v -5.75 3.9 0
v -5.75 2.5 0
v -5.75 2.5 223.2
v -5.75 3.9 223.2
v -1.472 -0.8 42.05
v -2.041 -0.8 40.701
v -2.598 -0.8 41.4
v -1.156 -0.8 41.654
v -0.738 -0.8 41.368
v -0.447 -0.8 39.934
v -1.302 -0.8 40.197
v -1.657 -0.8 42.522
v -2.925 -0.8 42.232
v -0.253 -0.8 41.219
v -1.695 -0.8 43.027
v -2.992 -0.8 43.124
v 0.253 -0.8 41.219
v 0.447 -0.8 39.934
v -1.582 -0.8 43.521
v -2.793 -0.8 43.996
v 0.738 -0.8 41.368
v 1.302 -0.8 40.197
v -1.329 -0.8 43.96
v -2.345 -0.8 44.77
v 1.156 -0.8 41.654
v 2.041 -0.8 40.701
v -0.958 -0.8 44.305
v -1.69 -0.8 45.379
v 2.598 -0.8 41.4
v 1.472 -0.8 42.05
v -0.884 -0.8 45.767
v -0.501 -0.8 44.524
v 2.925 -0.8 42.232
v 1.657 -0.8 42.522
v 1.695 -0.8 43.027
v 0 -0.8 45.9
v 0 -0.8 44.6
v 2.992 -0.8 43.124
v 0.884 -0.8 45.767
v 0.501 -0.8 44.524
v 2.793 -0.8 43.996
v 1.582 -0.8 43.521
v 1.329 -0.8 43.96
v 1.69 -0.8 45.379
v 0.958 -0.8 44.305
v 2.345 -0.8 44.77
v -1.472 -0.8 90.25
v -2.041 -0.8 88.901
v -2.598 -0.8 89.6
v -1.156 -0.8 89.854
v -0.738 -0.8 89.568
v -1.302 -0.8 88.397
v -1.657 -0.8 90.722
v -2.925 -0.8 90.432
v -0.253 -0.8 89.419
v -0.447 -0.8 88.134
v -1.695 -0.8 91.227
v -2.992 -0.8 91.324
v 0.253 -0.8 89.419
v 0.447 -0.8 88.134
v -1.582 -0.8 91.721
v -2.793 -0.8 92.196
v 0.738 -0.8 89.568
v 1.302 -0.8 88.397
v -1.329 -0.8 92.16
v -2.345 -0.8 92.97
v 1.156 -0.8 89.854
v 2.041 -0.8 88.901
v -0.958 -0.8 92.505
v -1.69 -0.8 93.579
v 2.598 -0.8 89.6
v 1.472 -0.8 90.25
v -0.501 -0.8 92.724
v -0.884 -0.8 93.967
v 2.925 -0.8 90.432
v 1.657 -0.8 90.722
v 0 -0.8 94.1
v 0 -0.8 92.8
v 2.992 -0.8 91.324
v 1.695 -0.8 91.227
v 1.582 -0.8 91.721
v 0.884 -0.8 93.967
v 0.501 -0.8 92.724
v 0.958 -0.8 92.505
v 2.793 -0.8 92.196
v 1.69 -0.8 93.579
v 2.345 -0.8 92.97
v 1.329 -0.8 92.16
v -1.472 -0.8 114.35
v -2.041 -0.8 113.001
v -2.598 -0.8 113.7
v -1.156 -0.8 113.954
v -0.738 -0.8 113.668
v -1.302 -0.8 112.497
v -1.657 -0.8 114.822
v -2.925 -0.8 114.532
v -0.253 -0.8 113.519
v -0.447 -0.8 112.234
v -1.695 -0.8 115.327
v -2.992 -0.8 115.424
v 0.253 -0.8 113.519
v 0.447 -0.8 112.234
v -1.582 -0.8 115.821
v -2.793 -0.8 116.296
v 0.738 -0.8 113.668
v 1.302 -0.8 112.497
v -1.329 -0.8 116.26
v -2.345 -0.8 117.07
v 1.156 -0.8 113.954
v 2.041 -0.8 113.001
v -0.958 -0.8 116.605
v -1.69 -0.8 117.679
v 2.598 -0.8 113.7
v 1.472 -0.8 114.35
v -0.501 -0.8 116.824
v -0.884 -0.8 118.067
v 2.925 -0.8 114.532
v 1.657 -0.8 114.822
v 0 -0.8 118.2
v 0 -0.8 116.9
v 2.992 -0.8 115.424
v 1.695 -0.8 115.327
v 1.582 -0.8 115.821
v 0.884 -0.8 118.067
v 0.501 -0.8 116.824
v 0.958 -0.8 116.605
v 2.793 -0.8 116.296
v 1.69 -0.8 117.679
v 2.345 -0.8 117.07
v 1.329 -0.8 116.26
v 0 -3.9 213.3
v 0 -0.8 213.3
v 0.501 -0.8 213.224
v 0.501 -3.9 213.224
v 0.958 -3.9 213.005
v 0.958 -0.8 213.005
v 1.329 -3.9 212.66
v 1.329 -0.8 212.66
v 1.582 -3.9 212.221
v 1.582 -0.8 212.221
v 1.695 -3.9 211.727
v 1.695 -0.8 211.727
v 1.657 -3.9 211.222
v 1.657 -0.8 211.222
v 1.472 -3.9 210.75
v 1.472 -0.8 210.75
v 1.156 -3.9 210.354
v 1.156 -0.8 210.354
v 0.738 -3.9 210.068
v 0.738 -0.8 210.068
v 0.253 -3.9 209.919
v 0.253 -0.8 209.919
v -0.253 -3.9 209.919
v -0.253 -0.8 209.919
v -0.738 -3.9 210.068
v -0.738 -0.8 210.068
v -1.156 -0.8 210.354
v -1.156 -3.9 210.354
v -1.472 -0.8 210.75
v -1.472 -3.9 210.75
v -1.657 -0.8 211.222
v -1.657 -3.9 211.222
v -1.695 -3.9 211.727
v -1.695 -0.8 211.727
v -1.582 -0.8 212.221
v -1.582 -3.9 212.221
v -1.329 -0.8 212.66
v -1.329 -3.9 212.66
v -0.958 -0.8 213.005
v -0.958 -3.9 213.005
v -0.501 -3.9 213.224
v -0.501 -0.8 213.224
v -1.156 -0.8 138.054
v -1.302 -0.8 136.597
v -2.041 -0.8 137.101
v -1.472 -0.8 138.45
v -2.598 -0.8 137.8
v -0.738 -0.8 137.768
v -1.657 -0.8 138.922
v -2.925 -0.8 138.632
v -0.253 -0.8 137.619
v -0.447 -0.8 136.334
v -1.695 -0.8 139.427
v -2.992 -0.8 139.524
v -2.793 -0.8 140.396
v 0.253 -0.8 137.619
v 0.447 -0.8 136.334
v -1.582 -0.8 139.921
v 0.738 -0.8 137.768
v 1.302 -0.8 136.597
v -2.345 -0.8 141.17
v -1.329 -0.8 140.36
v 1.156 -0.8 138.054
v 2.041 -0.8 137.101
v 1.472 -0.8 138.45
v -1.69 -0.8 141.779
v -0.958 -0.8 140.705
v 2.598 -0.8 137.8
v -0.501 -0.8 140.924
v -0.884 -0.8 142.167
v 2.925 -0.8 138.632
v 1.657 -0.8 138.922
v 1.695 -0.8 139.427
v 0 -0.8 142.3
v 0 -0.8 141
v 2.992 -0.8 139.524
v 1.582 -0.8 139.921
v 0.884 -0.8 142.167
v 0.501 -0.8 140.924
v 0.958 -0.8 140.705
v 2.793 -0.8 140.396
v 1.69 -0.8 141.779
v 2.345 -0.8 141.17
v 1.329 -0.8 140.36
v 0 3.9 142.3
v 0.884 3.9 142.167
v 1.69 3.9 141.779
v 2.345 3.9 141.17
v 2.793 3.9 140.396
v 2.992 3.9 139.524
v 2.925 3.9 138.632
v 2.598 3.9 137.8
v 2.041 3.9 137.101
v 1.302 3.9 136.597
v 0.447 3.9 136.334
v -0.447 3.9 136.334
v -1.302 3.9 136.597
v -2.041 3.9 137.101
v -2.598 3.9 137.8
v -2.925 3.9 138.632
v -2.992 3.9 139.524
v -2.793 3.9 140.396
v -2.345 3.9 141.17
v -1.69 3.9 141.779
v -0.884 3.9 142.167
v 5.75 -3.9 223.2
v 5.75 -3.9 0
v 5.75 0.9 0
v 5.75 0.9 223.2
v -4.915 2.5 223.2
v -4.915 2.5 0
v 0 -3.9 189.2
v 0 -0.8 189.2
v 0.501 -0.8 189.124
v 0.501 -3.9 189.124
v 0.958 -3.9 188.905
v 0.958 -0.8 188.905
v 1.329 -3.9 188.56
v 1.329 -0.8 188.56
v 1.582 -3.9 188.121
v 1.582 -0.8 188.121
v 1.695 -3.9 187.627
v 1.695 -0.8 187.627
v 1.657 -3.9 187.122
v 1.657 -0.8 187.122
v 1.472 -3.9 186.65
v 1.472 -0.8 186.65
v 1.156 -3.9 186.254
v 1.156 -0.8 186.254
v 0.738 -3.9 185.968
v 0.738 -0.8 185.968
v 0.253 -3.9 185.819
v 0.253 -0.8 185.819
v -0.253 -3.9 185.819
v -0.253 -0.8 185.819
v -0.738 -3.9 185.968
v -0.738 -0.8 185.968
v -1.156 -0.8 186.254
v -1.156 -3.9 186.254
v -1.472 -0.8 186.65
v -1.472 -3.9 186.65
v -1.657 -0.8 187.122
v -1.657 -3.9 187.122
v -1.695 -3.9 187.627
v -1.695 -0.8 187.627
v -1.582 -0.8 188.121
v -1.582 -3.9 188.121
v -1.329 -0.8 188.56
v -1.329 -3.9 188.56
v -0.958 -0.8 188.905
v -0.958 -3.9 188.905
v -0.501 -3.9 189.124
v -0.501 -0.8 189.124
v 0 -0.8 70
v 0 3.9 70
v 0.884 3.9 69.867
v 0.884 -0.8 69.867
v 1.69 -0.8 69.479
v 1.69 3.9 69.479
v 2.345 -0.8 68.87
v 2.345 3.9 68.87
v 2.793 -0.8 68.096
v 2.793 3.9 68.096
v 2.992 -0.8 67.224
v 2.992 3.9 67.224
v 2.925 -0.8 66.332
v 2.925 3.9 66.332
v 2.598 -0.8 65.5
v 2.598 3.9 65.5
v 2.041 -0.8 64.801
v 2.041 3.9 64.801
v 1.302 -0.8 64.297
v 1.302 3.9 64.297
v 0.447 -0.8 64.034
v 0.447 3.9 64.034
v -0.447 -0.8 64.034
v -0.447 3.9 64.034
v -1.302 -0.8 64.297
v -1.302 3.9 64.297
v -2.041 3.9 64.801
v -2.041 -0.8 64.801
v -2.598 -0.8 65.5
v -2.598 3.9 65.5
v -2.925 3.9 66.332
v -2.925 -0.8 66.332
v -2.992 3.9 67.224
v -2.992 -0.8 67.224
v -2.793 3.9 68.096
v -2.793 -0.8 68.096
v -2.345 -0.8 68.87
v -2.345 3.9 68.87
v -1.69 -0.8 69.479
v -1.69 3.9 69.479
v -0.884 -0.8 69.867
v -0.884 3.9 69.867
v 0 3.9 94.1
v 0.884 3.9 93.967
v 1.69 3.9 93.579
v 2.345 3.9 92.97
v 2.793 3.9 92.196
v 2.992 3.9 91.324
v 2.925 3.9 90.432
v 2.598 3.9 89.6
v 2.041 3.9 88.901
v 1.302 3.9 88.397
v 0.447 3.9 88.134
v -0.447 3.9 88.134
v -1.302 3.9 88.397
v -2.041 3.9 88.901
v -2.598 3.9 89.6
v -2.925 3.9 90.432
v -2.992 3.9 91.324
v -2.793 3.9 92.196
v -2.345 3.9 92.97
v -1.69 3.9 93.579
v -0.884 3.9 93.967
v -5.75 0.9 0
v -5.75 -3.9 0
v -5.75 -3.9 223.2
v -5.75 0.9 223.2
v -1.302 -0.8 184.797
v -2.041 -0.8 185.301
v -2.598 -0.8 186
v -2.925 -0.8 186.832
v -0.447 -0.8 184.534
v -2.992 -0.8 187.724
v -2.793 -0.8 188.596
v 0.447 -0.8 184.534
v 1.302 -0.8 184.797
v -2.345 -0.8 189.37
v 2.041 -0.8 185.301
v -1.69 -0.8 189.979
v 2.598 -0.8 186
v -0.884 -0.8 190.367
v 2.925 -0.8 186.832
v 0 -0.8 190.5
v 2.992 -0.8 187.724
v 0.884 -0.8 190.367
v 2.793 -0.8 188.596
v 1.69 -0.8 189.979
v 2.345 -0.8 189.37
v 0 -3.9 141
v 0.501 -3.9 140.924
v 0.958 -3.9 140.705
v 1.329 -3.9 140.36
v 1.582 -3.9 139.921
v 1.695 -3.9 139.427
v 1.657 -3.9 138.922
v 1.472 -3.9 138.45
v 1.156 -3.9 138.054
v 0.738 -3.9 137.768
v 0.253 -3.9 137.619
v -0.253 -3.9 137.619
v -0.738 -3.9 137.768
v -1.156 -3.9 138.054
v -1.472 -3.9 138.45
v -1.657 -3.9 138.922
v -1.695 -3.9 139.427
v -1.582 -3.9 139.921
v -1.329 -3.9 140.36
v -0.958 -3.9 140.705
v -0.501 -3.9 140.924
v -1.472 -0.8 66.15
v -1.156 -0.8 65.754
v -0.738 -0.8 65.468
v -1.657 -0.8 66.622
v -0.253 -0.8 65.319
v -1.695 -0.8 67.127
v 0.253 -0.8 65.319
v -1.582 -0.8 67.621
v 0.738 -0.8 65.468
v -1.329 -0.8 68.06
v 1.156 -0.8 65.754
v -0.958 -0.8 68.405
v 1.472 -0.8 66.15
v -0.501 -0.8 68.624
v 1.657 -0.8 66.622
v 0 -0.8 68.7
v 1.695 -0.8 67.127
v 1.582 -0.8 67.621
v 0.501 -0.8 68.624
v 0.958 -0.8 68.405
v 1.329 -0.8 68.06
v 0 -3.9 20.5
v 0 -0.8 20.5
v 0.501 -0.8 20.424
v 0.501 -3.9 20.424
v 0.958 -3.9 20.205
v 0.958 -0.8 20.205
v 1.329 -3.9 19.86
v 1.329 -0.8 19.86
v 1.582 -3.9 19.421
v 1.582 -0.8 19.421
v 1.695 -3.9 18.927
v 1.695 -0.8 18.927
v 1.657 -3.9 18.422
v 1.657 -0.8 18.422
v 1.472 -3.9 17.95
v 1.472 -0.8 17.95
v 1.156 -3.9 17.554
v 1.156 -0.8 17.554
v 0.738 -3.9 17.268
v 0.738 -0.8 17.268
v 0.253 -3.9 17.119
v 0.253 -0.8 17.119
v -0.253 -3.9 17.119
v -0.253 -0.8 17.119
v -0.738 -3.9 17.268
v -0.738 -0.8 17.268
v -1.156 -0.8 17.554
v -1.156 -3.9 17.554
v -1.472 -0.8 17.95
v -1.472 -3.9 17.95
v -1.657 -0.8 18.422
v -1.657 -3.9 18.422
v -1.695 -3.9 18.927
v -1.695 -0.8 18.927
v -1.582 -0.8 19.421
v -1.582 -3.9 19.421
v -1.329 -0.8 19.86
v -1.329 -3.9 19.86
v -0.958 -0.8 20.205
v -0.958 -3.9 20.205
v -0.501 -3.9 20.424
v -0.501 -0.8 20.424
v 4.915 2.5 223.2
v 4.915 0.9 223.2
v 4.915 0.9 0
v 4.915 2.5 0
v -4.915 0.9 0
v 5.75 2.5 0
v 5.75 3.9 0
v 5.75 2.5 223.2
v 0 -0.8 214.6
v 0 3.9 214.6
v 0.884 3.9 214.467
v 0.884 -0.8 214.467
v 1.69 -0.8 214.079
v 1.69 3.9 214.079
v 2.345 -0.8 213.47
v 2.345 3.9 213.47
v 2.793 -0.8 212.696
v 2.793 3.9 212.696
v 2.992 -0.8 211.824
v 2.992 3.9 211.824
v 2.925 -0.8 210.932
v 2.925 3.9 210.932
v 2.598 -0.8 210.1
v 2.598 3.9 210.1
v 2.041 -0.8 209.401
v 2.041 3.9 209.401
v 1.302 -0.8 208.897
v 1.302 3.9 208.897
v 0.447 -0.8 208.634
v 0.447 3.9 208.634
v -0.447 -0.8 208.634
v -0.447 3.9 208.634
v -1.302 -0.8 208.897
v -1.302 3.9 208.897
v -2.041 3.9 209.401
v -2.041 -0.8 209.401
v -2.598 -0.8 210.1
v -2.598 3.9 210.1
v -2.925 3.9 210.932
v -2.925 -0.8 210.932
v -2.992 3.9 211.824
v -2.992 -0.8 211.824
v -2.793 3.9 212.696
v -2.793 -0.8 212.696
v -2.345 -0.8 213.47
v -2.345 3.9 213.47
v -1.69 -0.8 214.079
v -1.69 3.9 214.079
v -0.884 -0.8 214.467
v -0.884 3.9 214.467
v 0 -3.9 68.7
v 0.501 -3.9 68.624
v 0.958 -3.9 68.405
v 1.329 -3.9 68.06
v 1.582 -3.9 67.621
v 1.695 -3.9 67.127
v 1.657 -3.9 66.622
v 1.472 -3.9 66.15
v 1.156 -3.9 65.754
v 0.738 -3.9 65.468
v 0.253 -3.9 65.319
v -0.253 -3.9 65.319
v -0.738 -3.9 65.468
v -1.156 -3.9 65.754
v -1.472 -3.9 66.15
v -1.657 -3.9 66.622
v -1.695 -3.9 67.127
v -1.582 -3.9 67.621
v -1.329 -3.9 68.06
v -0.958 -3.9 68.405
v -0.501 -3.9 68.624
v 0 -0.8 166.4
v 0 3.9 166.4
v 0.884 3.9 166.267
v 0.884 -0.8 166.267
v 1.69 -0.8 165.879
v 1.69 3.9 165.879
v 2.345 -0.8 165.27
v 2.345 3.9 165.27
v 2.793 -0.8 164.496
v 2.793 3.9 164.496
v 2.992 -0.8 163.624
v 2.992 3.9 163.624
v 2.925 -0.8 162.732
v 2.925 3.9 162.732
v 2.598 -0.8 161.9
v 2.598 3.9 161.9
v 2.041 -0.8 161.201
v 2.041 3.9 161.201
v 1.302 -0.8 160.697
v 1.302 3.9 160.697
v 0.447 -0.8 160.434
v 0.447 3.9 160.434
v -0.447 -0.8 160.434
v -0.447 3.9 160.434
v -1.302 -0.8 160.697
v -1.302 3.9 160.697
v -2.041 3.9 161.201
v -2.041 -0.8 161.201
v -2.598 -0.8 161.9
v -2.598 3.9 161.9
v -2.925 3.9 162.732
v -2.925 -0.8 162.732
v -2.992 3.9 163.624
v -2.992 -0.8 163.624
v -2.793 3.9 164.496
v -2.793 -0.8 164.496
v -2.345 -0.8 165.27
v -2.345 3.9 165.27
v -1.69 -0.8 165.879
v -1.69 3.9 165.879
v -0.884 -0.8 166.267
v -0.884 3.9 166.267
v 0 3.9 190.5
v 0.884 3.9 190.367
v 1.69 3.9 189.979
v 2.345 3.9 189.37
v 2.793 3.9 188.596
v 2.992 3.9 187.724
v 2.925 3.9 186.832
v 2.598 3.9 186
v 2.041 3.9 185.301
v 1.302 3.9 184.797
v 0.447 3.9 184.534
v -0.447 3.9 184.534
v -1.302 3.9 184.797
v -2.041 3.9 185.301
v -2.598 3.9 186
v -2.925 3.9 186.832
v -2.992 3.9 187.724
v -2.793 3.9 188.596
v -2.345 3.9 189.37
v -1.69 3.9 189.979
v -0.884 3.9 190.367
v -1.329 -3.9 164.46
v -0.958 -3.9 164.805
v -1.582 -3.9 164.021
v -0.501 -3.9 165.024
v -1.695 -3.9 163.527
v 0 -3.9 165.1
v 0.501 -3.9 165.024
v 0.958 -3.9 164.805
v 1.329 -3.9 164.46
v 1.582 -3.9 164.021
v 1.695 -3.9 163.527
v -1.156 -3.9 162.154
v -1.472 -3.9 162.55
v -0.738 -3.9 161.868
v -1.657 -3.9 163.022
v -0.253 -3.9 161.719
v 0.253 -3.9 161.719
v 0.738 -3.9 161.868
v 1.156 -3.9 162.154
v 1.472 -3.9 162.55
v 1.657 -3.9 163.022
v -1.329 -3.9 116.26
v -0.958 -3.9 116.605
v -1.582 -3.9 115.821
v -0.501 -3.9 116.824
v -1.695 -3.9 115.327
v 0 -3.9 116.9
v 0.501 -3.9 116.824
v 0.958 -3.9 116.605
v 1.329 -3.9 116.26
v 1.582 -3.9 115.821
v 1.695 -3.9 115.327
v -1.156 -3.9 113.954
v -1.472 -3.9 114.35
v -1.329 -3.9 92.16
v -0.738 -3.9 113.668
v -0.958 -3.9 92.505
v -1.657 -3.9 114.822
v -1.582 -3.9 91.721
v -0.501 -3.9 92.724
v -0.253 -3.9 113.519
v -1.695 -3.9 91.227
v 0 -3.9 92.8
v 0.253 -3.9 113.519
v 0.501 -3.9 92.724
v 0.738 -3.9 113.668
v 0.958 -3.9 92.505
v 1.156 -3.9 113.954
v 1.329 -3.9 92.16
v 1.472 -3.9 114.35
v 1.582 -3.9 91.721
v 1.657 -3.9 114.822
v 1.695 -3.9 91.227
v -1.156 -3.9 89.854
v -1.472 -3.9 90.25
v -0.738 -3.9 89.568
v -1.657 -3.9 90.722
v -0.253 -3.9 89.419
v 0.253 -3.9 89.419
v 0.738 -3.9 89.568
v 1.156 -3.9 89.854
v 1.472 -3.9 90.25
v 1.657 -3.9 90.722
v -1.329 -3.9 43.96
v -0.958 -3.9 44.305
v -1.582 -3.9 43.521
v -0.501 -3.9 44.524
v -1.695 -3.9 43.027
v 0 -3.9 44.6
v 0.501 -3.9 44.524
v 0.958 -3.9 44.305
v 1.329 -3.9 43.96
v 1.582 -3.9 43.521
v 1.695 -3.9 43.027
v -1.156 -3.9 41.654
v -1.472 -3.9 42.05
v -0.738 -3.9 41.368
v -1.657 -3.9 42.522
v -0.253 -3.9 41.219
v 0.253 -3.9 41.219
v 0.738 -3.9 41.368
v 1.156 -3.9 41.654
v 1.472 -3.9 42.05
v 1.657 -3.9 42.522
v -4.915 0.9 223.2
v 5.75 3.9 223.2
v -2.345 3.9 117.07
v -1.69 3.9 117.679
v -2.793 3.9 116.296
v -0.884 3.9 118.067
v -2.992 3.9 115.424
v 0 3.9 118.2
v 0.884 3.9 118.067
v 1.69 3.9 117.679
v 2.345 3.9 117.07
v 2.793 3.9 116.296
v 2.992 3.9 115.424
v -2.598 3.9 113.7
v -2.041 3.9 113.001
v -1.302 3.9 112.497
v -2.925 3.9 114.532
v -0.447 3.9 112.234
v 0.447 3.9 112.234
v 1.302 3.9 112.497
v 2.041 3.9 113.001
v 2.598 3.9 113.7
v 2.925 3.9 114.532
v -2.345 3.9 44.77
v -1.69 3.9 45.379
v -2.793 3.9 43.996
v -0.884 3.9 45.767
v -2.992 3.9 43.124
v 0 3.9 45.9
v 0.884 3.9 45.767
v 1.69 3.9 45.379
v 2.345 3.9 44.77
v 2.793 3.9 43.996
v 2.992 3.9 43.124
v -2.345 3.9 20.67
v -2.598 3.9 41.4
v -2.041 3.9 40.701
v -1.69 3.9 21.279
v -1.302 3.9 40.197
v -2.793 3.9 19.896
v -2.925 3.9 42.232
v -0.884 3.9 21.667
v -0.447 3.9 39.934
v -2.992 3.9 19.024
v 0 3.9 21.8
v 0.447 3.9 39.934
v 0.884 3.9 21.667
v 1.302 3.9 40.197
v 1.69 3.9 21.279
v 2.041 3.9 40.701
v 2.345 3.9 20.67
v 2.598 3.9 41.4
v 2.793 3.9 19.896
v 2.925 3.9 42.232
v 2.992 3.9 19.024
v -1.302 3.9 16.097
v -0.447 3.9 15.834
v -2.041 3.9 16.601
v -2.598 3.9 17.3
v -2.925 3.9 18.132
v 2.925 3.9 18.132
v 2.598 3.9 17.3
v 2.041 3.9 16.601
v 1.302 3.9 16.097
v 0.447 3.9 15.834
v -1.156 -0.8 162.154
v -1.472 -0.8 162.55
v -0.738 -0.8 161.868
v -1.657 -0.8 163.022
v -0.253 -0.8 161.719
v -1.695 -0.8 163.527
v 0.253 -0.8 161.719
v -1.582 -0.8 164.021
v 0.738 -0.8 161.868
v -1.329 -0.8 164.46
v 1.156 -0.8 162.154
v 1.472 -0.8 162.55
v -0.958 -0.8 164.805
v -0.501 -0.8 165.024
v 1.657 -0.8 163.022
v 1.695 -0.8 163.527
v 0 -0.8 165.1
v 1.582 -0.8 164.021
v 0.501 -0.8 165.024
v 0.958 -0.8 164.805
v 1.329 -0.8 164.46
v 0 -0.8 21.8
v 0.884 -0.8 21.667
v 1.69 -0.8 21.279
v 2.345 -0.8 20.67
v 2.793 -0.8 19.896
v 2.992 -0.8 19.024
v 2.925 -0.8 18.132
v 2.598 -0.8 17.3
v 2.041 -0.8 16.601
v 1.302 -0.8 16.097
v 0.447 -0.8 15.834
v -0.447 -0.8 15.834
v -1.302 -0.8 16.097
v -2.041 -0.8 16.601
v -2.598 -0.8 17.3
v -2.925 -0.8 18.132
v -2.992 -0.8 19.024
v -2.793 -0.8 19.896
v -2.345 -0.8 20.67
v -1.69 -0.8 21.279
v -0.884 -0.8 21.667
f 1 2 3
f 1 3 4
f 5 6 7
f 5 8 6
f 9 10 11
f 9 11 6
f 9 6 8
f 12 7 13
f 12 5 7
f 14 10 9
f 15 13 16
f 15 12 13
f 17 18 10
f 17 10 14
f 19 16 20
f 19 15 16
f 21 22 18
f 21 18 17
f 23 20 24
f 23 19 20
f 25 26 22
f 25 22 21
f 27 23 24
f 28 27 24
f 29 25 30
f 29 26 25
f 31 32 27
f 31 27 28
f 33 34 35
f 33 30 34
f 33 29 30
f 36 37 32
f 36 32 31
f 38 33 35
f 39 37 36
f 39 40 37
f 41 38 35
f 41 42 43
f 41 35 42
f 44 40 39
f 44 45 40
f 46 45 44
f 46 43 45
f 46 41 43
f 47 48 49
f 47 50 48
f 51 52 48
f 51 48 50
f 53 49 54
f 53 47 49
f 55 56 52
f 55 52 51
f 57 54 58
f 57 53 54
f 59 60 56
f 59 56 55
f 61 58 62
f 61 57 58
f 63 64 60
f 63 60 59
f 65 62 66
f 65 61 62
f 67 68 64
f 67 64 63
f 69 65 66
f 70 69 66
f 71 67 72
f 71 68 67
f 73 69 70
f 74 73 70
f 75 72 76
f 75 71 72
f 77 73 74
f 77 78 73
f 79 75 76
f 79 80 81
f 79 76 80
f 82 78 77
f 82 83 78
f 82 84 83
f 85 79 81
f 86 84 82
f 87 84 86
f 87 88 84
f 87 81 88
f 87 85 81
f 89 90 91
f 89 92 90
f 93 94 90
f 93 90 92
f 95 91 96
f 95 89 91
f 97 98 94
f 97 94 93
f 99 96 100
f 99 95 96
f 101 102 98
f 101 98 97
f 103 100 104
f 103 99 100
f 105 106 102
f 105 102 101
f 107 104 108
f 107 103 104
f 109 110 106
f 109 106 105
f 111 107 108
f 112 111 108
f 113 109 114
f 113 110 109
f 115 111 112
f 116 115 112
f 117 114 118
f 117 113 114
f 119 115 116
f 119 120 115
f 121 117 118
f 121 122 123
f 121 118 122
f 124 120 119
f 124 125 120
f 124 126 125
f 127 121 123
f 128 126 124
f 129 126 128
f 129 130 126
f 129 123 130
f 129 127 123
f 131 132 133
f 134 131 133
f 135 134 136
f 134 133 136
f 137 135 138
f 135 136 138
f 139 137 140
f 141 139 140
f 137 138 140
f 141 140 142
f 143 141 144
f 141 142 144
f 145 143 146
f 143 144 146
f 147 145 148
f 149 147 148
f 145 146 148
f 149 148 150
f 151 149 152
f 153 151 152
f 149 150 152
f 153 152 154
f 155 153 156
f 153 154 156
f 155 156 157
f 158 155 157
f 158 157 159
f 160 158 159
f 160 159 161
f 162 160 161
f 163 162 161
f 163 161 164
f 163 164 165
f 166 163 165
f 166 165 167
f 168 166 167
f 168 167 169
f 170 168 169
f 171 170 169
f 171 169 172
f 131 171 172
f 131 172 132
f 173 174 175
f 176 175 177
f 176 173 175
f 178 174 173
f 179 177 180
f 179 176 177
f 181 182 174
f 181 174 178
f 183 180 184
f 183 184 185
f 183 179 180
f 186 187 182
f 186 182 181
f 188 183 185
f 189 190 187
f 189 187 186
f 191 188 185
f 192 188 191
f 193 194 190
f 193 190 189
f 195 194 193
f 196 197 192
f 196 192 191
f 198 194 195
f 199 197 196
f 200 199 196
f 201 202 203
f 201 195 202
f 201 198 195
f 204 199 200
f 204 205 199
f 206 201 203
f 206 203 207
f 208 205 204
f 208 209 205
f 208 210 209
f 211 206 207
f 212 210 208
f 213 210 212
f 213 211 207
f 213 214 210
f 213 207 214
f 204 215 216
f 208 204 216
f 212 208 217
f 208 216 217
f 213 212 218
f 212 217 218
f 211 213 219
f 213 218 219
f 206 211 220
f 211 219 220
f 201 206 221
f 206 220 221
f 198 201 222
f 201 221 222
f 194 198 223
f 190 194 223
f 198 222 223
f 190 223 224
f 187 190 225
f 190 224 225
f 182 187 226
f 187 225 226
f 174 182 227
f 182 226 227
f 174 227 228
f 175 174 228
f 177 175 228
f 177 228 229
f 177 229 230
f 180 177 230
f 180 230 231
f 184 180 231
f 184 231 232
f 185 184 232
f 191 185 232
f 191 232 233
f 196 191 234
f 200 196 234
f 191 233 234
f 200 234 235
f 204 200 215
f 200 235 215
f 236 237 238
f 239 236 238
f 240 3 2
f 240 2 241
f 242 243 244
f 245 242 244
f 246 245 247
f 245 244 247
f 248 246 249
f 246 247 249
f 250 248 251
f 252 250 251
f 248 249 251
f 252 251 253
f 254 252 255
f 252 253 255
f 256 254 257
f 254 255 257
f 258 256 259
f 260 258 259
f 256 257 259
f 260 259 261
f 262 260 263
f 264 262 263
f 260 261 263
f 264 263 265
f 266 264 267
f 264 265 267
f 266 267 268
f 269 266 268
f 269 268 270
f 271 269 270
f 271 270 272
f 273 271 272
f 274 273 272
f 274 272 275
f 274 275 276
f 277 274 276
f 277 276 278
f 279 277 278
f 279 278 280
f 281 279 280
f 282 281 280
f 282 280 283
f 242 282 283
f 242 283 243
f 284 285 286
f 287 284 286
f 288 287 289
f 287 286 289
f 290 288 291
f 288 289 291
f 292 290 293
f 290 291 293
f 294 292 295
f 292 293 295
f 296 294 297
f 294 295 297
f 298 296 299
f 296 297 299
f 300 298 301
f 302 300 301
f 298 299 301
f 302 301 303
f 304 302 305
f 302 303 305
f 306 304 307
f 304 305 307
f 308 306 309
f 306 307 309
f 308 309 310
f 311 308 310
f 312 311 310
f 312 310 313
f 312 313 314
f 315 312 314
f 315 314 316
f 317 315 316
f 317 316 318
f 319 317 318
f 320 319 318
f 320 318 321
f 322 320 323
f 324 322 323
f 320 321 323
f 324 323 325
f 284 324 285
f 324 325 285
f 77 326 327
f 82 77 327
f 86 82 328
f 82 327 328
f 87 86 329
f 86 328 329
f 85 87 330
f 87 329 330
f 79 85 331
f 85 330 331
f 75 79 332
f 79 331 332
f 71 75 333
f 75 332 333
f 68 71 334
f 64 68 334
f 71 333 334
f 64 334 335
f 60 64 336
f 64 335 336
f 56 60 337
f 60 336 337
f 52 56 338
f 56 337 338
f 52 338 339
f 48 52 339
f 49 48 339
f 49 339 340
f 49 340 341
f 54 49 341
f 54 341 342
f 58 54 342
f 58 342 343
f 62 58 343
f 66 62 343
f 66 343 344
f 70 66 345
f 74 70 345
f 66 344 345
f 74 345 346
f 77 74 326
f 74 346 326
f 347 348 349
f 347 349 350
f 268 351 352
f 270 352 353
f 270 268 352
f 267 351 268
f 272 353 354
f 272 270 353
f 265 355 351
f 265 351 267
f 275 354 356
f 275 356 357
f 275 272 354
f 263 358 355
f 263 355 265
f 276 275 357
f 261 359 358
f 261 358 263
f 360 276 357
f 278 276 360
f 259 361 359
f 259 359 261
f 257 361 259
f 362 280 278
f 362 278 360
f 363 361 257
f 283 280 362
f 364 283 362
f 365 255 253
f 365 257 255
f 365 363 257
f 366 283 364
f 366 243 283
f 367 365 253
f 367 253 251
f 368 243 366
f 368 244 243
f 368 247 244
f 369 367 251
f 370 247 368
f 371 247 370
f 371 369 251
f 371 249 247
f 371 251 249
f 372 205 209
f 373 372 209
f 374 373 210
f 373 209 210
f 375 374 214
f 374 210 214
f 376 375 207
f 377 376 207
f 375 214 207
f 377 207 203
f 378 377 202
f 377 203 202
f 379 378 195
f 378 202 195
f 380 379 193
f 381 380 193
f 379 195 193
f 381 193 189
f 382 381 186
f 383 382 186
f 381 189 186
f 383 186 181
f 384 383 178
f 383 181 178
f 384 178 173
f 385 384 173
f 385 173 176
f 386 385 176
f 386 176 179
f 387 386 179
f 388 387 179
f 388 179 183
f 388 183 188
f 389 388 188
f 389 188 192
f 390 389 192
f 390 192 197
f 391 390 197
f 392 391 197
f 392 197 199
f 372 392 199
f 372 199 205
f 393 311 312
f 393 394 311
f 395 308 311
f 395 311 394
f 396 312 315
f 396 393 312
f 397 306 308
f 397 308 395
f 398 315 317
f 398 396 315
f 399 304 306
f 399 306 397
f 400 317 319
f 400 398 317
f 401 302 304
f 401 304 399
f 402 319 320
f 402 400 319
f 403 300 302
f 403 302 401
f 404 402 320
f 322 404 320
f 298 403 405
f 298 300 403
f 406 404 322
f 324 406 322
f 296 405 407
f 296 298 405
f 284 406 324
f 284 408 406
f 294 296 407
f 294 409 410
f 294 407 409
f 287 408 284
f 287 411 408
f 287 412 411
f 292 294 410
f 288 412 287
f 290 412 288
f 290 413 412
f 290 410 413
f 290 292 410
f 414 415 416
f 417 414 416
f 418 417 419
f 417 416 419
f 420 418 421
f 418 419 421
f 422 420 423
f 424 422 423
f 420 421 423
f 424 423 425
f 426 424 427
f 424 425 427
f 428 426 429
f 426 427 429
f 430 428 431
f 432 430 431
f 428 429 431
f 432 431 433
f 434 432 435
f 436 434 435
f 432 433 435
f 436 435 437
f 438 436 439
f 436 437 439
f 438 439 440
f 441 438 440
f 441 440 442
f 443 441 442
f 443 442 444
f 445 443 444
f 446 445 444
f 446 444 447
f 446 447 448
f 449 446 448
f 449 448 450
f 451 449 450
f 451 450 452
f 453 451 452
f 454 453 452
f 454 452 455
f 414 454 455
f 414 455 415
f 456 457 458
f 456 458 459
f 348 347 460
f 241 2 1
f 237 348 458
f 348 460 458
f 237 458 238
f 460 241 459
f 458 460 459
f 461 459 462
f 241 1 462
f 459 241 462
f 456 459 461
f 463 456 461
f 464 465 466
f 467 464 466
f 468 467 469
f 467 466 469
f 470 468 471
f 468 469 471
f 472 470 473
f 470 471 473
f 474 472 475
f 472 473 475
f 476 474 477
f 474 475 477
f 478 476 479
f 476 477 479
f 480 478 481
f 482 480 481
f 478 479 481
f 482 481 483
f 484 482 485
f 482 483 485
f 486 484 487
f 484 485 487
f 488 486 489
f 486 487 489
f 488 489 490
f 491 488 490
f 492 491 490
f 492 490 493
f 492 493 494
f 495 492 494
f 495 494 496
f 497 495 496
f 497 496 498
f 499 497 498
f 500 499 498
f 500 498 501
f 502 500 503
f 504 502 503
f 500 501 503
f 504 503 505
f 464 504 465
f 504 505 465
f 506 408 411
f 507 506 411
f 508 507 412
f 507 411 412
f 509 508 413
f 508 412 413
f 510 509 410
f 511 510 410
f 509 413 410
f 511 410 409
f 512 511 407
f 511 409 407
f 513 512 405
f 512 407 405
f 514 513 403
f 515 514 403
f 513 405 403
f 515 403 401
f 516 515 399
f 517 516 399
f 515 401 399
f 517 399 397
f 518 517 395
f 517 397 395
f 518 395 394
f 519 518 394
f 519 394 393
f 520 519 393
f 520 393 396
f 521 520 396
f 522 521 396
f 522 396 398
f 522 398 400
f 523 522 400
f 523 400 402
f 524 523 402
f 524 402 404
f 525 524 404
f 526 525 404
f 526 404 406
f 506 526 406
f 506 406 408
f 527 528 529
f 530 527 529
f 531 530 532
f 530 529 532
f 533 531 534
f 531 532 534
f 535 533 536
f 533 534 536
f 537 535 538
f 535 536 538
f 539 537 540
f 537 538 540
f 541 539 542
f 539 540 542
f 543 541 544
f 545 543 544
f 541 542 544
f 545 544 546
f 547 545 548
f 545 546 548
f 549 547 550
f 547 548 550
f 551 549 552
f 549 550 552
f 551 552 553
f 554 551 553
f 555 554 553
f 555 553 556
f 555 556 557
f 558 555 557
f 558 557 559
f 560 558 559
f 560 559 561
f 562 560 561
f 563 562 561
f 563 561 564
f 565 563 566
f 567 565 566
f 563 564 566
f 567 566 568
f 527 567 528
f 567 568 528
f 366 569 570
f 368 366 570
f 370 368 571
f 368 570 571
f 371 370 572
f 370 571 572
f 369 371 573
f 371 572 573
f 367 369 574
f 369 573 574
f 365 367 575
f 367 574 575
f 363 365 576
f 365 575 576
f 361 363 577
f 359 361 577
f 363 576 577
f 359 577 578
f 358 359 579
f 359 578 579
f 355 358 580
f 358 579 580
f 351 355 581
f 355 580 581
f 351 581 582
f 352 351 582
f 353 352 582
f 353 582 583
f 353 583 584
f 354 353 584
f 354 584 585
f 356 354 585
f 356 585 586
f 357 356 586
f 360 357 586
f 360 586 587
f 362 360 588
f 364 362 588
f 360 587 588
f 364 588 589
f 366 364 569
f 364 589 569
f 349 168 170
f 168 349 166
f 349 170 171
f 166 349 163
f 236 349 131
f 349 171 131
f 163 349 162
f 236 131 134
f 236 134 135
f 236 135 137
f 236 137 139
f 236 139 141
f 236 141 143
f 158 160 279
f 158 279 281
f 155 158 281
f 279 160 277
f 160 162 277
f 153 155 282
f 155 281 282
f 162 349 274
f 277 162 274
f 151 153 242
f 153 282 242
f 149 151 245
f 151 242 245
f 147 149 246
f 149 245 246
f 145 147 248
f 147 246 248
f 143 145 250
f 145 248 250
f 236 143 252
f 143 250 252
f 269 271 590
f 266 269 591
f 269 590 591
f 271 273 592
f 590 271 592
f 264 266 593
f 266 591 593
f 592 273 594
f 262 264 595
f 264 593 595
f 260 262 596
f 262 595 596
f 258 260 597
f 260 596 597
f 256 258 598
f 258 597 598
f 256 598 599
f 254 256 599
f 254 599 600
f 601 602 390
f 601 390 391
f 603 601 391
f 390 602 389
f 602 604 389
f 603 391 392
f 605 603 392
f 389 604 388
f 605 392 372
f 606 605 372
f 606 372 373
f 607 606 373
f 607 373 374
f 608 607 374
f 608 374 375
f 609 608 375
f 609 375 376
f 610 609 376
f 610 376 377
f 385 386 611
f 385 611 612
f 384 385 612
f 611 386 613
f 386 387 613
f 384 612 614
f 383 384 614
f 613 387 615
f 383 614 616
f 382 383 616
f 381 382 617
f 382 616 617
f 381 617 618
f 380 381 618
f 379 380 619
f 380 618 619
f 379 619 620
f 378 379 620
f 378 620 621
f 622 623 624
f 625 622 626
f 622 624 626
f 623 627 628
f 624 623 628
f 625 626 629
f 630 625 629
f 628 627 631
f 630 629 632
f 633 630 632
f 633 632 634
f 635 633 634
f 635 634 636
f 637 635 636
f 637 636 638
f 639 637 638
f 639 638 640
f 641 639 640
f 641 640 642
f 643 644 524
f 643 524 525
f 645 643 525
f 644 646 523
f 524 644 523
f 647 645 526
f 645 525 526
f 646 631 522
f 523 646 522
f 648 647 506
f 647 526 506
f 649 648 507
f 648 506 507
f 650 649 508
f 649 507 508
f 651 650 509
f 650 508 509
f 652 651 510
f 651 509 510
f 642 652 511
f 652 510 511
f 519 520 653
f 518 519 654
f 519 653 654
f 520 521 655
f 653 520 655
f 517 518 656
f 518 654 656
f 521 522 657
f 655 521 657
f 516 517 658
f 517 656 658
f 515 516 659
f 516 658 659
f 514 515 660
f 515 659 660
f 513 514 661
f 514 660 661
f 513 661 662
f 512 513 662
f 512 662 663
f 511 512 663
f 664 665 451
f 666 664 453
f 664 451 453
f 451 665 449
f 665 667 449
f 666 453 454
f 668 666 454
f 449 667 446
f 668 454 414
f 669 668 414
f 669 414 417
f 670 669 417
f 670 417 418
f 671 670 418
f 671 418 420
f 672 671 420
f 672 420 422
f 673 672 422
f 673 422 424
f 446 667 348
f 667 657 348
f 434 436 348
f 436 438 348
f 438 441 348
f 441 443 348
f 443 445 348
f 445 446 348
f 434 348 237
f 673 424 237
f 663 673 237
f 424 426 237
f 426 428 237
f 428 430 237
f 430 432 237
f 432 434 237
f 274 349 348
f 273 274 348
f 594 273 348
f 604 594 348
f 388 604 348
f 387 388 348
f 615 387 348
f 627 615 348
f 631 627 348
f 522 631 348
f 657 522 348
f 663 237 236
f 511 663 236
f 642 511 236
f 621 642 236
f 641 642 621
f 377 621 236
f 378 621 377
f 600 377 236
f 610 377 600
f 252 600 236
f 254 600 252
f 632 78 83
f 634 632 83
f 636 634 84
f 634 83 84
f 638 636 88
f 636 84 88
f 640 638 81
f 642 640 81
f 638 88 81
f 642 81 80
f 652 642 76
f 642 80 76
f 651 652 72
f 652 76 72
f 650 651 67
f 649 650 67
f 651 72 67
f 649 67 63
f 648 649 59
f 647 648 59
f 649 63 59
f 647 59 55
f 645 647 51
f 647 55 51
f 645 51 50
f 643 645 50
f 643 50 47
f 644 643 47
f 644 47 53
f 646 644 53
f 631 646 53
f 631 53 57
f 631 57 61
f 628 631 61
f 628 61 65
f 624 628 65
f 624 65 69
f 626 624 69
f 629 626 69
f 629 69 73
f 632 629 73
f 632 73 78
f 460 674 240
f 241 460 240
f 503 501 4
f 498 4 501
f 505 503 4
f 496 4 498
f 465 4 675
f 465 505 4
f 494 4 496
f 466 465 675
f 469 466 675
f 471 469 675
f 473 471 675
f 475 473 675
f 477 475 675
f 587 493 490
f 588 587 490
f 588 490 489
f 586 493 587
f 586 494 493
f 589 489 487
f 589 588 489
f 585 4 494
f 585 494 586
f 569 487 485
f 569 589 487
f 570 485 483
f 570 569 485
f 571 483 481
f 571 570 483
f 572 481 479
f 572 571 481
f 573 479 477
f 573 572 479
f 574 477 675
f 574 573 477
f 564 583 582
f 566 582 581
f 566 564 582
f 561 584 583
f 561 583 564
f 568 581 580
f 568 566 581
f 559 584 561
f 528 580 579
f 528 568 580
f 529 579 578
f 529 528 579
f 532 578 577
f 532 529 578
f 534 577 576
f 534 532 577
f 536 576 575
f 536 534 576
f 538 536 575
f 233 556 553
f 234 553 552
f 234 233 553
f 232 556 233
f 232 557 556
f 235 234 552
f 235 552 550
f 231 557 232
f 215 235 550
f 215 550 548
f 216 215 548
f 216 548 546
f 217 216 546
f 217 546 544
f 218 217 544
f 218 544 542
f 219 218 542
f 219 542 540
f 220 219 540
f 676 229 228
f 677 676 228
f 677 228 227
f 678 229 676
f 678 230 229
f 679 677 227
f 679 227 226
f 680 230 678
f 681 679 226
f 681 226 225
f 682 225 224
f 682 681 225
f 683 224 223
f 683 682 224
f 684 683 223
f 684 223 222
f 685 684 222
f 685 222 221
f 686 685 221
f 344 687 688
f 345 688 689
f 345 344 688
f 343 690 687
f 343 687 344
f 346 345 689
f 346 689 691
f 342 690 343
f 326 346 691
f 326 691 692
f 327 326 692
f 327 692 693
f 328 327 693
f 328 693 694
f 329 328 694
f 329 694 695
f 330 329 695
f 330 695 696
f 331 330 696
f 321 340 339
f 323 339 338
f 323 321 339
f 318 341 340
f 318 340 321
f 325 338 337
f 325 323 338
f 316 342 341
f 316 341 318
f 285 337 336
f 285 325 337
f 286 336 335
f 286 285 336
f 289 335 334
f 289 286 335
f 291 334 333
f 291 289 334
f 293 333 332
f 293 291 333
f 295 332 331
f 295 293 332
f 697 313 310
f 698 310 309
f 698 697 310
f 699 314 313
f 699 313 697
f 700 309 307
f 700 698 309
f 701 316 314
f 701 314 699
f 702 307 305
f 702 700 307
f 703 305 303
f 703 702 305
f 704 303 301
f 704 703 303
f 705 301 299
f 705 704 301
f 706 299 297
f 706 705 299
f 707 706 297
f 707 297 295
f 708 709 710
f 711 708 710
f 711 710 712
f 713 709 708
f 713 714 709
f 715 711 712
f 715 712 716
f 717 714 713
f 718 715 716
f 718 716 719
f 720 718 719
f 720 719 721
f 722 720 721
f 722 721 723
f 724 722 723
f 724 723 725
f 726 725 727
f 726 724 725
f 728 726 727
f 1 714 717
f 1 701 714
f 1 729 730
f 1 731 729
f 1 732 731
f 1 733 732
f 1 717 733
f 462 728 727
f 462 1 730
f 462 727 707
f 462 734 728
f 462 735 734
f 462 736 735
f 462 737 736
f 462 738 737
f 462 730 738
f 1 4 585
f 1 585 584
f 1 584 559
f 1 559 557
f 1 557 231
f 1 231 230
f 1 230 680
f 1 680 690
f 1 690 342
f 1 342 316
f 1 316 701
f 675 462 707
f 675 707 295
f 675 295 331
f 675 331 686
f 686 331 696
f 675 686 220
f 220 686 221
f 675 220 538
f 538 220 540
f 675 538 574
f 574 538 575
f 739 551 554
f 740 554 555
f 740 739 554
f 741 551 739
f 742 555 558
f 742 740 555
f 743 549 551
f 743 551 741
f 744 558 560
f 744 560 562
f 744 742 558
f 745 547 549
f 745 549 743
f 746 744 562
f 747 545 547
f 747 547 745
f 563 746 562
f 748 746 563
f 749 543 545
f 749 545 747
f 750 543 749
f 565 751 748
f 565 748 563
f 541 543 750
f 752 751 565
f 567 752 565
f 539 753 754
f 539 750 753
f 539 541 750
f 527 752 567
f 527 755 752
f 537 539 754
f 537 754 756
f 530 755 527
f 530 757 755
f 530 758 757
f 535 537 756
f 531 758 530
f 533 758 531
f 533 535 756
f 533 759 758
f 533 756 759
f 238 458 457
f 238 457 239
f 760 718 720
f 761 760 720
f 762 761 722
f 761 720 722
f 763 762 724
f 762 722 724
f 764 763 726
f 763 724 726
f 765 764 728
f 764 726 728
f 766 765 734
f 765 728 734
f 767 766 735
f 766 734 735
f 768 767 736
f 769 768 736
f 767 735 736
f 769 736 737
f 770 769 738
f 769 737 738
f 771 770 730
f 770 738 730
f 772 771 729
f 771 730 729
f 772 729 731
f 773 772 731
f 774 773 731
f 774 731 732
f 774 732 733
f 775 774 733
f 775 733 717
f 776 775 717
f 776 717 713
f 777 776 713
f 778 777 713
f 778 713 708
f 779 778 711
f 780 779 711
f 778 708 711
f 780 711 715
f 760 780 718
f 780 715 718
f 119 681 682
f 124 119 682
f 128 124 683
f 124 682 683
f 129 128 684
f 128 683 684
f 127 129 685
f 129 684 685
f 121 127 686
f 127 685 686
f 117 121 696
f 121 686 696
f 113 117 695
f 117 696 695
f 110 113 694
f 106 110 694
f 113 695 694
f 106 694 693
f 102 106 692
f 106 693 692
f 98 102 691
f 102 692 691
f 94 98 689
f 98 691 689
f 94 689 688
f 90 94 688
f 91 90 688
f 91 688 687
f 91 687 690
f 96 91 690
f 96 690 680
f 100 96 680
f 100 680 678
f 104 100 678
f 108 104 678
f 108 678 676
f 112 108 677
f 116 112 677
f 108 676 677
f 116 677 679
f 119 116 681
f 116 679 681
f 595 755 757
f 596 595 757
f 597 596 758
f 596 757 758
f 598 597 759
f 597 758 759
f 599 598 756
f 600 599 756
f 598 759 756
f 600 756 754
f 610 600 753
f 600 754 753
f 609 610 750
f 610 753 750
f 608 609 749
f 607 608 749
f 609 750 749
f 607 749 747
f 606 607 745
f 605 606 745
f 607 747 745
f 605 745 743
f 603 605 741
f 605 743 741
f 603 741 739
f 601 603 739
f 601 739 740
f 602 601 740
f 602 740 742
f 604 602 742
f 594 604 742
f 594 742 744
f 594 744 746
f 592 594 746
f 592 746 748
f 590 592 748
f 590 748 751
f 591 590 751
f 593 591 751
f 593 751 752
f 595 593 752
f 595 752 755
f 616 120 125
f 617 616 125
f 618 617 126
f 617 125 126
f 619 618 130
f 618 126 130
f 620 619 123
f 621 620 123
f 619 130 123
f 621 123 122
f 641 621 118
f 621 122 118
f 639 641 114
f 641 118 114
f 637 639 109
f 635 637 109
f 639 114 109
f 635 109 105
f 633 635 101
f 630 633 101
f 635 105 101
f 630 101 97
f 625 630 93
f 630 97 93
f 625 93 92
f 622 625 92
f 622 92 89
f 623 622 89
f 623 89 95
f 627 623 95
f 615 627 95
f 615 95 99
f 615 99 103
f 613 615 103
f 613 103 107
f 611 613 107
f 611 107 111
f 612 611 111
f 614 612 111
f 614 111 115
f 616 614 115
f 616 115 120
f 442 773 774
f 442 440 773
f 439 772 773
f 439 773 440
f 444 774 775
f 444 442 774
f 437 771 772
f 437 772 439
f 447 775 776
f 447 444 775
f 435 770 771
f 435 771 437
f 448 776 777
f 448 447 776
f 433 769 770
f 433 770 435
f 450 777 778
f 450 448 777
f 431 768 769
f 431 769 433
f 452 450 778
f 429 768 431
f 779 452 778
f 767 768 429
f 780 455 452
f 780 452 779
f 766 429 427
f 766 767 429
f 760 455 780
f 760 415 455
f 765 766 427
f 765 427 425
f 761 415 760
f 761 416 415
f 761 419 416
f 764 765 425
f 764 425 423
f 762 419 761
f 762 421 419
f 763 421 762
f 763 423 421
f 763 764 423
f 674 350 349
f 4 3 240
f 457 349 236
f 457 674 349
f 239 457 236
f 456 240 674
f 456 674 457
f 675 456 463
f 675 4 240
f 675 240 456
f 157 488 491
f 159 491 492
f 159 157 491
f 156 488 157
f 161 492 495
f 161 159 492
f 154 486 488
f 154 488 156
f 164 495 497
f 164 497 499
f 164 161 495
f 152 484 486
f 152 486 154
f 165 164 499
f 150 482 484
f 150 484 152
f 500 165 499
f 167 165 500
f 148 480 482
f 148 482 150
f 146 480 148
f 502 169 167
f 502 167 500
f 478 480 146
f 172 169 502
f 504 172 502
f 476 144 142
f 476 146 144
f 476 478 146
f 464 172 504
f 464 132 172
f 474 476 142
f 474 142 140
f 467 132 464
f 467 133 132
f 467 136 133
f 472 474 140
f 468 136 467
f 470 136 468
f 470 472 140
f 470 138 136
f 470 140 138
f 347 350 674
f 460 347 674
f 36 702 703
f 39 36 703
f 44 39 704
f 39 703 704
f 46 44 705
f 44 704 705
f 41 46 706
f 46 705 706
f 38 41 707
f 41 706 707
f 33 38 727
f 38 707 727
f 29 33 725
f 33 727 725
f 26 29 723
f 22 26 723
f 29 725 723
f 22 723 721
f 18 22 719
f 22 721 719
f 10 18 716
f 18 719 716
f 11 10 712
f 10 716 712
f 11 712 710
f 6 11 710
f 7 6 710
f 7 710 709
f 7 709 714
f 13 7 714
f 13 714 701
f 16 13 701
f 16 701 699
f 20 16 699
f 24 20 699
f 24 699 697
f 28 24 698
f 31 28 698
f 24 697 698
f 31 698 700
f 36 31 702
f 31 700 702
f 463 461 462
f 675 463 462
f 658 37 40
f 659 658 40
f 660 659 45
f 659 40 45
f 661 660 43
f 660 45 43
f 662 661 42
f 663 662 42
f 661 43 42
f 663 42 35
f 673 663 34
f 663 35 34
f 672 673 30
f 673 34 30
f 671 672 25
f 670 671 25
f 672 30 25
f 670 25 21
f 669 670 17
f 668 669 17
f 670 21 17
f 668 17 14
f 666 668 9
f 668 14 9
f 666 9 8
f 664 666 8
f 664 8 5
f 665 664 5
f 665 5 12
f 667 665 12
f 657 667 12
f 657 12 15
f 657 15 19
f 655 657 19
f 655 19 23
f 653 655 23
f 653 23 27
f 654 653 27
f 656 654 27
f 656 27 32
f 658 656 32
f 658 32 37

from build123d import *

# Parameters (mm, degrees)
SKETCH1_W           = 11.5
SKETCH1_H           = 7.8
BOSS_EXTRUDE1_DEPTH = 223.2
SKETCH2_W           = 0.835250229
SKETCH2_H           = 1.6
CUT_EXTRUDE1_DEPTH  = 224.308111138
SKETCH3_R           = 3
CUT_EXTRUDE2_DEPTH  = 4.7
SKETCH4_R           = 1.7
CUT_EXTRUDE3_DEPTH  = 224.323515331


with BuildPart() as part:
    # Sketch1 → Boss-Extrude1 (new body)
    with BuildSketch(Plane.XY):
        Rectangle(SKETCH1_W, SKETCH1_H)
    extrude(amount=BOSS_EXTRUDE1_DEPTH)

    # Sketch2 → Cut-Extrude1 (cut, through all)
    with BuildSketch(Plane.XY.offset(223.2)):
        with Locations((5.332374886, 1.7)):
            Rectangle(SKETCH2_W, SKETCH2_H)
        with Locations((-5.332374886, 1.7)):
            Rectangle(SKETCH2_W, SKETCH2_H)
    extrude(amount=-CUT_EXTRUDE1_DEPTH, mode=Mode.SUBTRACT)

    # Sketch3 → Cut-Extrude2 (cut)
    with BuildSketch(Plane(origin=(0, 3.9, 0), x_dir=(1, 0, 0), z_dir=(0, 1, 0))):
        with Locations(Location((0, -211.6, 0), (0, 0, 270))):
            Circle(SKETCH3_R)
        with Locations(Location((0, -187.5, 0), (0, 0, 270))):
            Circle(SKETCH3_R)
        with Locations(Location((0, -163.4, 0), (0, 0, 270))):
            Circle(SKETCH3_R)
        with Locations(Location((0, -139.3, 0), (0, 0, 270))):
            Circle(SKETCH3_R)
        with Locations(Location((0, -115.2, 0), (0, 0, 270))):
            Circle(SKETCH3_R)
        with Locations(Location((0, -91.1, 0), (0, 0, 270))):
            Circle(SKETCH3_R)
        with Locations(Location((0, -67, 0), (0, 0, 270))):
            Circle(SKETCH3_R)
        with Locations(Location((0, -42.9, 0), (0, 0, 270))):
            Circle(SKETCH3_R)
        with Locations(Location((0, -18.8, 0), (0, 0, 270))):
            Circle(SKETCH3_R)
    extrude(amount=-CUT_EXTRUDE2_DEPTH, mode=Mode.SUBTRACT)

    # Sketch4 → Cut-Extrude3 (cut, through all)
    with BuildSketch(Plane(origin=(0, -0.8, 0), x_dir=(1, 0, 0), z_dir=(0, 1, 0))):
        with Locations(Location((0, -211.6, 0), (0, 0, 270))):
            Circle(SKETCH4_R)
        with Locations(Location((0, -187.5, 0), (0, 0, 270))):
            Circle(SKETCH4_R)
        with Locations(Location((0, -163.4, 0), (0, 0, 270))):
            Circle(SKETCH4_R)
        with Locations(Location((0, -139.3, 0), (0, 0, 270))):
            Circle(SKETCH4_R)
        with Locations(Location((0, -115.2, 0), (0, 0, 270))):
            Circle(SKETCH4_R)
        with Locations(Location((0, -91.1, 0), (0, 0, 270))):
            Circle(SKETCH4_R)
        with Locations(Location((0, -67, 0), (0, 0, 270))):
            Circle(SKETCH4_R)
        with Locations(Location((0, -42.9, 0), (0, 0, 270))):
            Circle(SKETCH4_R)
        with Locations(Location((0, -18.8, 0), (0, 0, 270))):
            Circle(SKETCH4_R)
    extrude(amount=-CUT_EXTRUDE3_DEPTH, mode=Mode.SUBTRACT)


solid = part.part
